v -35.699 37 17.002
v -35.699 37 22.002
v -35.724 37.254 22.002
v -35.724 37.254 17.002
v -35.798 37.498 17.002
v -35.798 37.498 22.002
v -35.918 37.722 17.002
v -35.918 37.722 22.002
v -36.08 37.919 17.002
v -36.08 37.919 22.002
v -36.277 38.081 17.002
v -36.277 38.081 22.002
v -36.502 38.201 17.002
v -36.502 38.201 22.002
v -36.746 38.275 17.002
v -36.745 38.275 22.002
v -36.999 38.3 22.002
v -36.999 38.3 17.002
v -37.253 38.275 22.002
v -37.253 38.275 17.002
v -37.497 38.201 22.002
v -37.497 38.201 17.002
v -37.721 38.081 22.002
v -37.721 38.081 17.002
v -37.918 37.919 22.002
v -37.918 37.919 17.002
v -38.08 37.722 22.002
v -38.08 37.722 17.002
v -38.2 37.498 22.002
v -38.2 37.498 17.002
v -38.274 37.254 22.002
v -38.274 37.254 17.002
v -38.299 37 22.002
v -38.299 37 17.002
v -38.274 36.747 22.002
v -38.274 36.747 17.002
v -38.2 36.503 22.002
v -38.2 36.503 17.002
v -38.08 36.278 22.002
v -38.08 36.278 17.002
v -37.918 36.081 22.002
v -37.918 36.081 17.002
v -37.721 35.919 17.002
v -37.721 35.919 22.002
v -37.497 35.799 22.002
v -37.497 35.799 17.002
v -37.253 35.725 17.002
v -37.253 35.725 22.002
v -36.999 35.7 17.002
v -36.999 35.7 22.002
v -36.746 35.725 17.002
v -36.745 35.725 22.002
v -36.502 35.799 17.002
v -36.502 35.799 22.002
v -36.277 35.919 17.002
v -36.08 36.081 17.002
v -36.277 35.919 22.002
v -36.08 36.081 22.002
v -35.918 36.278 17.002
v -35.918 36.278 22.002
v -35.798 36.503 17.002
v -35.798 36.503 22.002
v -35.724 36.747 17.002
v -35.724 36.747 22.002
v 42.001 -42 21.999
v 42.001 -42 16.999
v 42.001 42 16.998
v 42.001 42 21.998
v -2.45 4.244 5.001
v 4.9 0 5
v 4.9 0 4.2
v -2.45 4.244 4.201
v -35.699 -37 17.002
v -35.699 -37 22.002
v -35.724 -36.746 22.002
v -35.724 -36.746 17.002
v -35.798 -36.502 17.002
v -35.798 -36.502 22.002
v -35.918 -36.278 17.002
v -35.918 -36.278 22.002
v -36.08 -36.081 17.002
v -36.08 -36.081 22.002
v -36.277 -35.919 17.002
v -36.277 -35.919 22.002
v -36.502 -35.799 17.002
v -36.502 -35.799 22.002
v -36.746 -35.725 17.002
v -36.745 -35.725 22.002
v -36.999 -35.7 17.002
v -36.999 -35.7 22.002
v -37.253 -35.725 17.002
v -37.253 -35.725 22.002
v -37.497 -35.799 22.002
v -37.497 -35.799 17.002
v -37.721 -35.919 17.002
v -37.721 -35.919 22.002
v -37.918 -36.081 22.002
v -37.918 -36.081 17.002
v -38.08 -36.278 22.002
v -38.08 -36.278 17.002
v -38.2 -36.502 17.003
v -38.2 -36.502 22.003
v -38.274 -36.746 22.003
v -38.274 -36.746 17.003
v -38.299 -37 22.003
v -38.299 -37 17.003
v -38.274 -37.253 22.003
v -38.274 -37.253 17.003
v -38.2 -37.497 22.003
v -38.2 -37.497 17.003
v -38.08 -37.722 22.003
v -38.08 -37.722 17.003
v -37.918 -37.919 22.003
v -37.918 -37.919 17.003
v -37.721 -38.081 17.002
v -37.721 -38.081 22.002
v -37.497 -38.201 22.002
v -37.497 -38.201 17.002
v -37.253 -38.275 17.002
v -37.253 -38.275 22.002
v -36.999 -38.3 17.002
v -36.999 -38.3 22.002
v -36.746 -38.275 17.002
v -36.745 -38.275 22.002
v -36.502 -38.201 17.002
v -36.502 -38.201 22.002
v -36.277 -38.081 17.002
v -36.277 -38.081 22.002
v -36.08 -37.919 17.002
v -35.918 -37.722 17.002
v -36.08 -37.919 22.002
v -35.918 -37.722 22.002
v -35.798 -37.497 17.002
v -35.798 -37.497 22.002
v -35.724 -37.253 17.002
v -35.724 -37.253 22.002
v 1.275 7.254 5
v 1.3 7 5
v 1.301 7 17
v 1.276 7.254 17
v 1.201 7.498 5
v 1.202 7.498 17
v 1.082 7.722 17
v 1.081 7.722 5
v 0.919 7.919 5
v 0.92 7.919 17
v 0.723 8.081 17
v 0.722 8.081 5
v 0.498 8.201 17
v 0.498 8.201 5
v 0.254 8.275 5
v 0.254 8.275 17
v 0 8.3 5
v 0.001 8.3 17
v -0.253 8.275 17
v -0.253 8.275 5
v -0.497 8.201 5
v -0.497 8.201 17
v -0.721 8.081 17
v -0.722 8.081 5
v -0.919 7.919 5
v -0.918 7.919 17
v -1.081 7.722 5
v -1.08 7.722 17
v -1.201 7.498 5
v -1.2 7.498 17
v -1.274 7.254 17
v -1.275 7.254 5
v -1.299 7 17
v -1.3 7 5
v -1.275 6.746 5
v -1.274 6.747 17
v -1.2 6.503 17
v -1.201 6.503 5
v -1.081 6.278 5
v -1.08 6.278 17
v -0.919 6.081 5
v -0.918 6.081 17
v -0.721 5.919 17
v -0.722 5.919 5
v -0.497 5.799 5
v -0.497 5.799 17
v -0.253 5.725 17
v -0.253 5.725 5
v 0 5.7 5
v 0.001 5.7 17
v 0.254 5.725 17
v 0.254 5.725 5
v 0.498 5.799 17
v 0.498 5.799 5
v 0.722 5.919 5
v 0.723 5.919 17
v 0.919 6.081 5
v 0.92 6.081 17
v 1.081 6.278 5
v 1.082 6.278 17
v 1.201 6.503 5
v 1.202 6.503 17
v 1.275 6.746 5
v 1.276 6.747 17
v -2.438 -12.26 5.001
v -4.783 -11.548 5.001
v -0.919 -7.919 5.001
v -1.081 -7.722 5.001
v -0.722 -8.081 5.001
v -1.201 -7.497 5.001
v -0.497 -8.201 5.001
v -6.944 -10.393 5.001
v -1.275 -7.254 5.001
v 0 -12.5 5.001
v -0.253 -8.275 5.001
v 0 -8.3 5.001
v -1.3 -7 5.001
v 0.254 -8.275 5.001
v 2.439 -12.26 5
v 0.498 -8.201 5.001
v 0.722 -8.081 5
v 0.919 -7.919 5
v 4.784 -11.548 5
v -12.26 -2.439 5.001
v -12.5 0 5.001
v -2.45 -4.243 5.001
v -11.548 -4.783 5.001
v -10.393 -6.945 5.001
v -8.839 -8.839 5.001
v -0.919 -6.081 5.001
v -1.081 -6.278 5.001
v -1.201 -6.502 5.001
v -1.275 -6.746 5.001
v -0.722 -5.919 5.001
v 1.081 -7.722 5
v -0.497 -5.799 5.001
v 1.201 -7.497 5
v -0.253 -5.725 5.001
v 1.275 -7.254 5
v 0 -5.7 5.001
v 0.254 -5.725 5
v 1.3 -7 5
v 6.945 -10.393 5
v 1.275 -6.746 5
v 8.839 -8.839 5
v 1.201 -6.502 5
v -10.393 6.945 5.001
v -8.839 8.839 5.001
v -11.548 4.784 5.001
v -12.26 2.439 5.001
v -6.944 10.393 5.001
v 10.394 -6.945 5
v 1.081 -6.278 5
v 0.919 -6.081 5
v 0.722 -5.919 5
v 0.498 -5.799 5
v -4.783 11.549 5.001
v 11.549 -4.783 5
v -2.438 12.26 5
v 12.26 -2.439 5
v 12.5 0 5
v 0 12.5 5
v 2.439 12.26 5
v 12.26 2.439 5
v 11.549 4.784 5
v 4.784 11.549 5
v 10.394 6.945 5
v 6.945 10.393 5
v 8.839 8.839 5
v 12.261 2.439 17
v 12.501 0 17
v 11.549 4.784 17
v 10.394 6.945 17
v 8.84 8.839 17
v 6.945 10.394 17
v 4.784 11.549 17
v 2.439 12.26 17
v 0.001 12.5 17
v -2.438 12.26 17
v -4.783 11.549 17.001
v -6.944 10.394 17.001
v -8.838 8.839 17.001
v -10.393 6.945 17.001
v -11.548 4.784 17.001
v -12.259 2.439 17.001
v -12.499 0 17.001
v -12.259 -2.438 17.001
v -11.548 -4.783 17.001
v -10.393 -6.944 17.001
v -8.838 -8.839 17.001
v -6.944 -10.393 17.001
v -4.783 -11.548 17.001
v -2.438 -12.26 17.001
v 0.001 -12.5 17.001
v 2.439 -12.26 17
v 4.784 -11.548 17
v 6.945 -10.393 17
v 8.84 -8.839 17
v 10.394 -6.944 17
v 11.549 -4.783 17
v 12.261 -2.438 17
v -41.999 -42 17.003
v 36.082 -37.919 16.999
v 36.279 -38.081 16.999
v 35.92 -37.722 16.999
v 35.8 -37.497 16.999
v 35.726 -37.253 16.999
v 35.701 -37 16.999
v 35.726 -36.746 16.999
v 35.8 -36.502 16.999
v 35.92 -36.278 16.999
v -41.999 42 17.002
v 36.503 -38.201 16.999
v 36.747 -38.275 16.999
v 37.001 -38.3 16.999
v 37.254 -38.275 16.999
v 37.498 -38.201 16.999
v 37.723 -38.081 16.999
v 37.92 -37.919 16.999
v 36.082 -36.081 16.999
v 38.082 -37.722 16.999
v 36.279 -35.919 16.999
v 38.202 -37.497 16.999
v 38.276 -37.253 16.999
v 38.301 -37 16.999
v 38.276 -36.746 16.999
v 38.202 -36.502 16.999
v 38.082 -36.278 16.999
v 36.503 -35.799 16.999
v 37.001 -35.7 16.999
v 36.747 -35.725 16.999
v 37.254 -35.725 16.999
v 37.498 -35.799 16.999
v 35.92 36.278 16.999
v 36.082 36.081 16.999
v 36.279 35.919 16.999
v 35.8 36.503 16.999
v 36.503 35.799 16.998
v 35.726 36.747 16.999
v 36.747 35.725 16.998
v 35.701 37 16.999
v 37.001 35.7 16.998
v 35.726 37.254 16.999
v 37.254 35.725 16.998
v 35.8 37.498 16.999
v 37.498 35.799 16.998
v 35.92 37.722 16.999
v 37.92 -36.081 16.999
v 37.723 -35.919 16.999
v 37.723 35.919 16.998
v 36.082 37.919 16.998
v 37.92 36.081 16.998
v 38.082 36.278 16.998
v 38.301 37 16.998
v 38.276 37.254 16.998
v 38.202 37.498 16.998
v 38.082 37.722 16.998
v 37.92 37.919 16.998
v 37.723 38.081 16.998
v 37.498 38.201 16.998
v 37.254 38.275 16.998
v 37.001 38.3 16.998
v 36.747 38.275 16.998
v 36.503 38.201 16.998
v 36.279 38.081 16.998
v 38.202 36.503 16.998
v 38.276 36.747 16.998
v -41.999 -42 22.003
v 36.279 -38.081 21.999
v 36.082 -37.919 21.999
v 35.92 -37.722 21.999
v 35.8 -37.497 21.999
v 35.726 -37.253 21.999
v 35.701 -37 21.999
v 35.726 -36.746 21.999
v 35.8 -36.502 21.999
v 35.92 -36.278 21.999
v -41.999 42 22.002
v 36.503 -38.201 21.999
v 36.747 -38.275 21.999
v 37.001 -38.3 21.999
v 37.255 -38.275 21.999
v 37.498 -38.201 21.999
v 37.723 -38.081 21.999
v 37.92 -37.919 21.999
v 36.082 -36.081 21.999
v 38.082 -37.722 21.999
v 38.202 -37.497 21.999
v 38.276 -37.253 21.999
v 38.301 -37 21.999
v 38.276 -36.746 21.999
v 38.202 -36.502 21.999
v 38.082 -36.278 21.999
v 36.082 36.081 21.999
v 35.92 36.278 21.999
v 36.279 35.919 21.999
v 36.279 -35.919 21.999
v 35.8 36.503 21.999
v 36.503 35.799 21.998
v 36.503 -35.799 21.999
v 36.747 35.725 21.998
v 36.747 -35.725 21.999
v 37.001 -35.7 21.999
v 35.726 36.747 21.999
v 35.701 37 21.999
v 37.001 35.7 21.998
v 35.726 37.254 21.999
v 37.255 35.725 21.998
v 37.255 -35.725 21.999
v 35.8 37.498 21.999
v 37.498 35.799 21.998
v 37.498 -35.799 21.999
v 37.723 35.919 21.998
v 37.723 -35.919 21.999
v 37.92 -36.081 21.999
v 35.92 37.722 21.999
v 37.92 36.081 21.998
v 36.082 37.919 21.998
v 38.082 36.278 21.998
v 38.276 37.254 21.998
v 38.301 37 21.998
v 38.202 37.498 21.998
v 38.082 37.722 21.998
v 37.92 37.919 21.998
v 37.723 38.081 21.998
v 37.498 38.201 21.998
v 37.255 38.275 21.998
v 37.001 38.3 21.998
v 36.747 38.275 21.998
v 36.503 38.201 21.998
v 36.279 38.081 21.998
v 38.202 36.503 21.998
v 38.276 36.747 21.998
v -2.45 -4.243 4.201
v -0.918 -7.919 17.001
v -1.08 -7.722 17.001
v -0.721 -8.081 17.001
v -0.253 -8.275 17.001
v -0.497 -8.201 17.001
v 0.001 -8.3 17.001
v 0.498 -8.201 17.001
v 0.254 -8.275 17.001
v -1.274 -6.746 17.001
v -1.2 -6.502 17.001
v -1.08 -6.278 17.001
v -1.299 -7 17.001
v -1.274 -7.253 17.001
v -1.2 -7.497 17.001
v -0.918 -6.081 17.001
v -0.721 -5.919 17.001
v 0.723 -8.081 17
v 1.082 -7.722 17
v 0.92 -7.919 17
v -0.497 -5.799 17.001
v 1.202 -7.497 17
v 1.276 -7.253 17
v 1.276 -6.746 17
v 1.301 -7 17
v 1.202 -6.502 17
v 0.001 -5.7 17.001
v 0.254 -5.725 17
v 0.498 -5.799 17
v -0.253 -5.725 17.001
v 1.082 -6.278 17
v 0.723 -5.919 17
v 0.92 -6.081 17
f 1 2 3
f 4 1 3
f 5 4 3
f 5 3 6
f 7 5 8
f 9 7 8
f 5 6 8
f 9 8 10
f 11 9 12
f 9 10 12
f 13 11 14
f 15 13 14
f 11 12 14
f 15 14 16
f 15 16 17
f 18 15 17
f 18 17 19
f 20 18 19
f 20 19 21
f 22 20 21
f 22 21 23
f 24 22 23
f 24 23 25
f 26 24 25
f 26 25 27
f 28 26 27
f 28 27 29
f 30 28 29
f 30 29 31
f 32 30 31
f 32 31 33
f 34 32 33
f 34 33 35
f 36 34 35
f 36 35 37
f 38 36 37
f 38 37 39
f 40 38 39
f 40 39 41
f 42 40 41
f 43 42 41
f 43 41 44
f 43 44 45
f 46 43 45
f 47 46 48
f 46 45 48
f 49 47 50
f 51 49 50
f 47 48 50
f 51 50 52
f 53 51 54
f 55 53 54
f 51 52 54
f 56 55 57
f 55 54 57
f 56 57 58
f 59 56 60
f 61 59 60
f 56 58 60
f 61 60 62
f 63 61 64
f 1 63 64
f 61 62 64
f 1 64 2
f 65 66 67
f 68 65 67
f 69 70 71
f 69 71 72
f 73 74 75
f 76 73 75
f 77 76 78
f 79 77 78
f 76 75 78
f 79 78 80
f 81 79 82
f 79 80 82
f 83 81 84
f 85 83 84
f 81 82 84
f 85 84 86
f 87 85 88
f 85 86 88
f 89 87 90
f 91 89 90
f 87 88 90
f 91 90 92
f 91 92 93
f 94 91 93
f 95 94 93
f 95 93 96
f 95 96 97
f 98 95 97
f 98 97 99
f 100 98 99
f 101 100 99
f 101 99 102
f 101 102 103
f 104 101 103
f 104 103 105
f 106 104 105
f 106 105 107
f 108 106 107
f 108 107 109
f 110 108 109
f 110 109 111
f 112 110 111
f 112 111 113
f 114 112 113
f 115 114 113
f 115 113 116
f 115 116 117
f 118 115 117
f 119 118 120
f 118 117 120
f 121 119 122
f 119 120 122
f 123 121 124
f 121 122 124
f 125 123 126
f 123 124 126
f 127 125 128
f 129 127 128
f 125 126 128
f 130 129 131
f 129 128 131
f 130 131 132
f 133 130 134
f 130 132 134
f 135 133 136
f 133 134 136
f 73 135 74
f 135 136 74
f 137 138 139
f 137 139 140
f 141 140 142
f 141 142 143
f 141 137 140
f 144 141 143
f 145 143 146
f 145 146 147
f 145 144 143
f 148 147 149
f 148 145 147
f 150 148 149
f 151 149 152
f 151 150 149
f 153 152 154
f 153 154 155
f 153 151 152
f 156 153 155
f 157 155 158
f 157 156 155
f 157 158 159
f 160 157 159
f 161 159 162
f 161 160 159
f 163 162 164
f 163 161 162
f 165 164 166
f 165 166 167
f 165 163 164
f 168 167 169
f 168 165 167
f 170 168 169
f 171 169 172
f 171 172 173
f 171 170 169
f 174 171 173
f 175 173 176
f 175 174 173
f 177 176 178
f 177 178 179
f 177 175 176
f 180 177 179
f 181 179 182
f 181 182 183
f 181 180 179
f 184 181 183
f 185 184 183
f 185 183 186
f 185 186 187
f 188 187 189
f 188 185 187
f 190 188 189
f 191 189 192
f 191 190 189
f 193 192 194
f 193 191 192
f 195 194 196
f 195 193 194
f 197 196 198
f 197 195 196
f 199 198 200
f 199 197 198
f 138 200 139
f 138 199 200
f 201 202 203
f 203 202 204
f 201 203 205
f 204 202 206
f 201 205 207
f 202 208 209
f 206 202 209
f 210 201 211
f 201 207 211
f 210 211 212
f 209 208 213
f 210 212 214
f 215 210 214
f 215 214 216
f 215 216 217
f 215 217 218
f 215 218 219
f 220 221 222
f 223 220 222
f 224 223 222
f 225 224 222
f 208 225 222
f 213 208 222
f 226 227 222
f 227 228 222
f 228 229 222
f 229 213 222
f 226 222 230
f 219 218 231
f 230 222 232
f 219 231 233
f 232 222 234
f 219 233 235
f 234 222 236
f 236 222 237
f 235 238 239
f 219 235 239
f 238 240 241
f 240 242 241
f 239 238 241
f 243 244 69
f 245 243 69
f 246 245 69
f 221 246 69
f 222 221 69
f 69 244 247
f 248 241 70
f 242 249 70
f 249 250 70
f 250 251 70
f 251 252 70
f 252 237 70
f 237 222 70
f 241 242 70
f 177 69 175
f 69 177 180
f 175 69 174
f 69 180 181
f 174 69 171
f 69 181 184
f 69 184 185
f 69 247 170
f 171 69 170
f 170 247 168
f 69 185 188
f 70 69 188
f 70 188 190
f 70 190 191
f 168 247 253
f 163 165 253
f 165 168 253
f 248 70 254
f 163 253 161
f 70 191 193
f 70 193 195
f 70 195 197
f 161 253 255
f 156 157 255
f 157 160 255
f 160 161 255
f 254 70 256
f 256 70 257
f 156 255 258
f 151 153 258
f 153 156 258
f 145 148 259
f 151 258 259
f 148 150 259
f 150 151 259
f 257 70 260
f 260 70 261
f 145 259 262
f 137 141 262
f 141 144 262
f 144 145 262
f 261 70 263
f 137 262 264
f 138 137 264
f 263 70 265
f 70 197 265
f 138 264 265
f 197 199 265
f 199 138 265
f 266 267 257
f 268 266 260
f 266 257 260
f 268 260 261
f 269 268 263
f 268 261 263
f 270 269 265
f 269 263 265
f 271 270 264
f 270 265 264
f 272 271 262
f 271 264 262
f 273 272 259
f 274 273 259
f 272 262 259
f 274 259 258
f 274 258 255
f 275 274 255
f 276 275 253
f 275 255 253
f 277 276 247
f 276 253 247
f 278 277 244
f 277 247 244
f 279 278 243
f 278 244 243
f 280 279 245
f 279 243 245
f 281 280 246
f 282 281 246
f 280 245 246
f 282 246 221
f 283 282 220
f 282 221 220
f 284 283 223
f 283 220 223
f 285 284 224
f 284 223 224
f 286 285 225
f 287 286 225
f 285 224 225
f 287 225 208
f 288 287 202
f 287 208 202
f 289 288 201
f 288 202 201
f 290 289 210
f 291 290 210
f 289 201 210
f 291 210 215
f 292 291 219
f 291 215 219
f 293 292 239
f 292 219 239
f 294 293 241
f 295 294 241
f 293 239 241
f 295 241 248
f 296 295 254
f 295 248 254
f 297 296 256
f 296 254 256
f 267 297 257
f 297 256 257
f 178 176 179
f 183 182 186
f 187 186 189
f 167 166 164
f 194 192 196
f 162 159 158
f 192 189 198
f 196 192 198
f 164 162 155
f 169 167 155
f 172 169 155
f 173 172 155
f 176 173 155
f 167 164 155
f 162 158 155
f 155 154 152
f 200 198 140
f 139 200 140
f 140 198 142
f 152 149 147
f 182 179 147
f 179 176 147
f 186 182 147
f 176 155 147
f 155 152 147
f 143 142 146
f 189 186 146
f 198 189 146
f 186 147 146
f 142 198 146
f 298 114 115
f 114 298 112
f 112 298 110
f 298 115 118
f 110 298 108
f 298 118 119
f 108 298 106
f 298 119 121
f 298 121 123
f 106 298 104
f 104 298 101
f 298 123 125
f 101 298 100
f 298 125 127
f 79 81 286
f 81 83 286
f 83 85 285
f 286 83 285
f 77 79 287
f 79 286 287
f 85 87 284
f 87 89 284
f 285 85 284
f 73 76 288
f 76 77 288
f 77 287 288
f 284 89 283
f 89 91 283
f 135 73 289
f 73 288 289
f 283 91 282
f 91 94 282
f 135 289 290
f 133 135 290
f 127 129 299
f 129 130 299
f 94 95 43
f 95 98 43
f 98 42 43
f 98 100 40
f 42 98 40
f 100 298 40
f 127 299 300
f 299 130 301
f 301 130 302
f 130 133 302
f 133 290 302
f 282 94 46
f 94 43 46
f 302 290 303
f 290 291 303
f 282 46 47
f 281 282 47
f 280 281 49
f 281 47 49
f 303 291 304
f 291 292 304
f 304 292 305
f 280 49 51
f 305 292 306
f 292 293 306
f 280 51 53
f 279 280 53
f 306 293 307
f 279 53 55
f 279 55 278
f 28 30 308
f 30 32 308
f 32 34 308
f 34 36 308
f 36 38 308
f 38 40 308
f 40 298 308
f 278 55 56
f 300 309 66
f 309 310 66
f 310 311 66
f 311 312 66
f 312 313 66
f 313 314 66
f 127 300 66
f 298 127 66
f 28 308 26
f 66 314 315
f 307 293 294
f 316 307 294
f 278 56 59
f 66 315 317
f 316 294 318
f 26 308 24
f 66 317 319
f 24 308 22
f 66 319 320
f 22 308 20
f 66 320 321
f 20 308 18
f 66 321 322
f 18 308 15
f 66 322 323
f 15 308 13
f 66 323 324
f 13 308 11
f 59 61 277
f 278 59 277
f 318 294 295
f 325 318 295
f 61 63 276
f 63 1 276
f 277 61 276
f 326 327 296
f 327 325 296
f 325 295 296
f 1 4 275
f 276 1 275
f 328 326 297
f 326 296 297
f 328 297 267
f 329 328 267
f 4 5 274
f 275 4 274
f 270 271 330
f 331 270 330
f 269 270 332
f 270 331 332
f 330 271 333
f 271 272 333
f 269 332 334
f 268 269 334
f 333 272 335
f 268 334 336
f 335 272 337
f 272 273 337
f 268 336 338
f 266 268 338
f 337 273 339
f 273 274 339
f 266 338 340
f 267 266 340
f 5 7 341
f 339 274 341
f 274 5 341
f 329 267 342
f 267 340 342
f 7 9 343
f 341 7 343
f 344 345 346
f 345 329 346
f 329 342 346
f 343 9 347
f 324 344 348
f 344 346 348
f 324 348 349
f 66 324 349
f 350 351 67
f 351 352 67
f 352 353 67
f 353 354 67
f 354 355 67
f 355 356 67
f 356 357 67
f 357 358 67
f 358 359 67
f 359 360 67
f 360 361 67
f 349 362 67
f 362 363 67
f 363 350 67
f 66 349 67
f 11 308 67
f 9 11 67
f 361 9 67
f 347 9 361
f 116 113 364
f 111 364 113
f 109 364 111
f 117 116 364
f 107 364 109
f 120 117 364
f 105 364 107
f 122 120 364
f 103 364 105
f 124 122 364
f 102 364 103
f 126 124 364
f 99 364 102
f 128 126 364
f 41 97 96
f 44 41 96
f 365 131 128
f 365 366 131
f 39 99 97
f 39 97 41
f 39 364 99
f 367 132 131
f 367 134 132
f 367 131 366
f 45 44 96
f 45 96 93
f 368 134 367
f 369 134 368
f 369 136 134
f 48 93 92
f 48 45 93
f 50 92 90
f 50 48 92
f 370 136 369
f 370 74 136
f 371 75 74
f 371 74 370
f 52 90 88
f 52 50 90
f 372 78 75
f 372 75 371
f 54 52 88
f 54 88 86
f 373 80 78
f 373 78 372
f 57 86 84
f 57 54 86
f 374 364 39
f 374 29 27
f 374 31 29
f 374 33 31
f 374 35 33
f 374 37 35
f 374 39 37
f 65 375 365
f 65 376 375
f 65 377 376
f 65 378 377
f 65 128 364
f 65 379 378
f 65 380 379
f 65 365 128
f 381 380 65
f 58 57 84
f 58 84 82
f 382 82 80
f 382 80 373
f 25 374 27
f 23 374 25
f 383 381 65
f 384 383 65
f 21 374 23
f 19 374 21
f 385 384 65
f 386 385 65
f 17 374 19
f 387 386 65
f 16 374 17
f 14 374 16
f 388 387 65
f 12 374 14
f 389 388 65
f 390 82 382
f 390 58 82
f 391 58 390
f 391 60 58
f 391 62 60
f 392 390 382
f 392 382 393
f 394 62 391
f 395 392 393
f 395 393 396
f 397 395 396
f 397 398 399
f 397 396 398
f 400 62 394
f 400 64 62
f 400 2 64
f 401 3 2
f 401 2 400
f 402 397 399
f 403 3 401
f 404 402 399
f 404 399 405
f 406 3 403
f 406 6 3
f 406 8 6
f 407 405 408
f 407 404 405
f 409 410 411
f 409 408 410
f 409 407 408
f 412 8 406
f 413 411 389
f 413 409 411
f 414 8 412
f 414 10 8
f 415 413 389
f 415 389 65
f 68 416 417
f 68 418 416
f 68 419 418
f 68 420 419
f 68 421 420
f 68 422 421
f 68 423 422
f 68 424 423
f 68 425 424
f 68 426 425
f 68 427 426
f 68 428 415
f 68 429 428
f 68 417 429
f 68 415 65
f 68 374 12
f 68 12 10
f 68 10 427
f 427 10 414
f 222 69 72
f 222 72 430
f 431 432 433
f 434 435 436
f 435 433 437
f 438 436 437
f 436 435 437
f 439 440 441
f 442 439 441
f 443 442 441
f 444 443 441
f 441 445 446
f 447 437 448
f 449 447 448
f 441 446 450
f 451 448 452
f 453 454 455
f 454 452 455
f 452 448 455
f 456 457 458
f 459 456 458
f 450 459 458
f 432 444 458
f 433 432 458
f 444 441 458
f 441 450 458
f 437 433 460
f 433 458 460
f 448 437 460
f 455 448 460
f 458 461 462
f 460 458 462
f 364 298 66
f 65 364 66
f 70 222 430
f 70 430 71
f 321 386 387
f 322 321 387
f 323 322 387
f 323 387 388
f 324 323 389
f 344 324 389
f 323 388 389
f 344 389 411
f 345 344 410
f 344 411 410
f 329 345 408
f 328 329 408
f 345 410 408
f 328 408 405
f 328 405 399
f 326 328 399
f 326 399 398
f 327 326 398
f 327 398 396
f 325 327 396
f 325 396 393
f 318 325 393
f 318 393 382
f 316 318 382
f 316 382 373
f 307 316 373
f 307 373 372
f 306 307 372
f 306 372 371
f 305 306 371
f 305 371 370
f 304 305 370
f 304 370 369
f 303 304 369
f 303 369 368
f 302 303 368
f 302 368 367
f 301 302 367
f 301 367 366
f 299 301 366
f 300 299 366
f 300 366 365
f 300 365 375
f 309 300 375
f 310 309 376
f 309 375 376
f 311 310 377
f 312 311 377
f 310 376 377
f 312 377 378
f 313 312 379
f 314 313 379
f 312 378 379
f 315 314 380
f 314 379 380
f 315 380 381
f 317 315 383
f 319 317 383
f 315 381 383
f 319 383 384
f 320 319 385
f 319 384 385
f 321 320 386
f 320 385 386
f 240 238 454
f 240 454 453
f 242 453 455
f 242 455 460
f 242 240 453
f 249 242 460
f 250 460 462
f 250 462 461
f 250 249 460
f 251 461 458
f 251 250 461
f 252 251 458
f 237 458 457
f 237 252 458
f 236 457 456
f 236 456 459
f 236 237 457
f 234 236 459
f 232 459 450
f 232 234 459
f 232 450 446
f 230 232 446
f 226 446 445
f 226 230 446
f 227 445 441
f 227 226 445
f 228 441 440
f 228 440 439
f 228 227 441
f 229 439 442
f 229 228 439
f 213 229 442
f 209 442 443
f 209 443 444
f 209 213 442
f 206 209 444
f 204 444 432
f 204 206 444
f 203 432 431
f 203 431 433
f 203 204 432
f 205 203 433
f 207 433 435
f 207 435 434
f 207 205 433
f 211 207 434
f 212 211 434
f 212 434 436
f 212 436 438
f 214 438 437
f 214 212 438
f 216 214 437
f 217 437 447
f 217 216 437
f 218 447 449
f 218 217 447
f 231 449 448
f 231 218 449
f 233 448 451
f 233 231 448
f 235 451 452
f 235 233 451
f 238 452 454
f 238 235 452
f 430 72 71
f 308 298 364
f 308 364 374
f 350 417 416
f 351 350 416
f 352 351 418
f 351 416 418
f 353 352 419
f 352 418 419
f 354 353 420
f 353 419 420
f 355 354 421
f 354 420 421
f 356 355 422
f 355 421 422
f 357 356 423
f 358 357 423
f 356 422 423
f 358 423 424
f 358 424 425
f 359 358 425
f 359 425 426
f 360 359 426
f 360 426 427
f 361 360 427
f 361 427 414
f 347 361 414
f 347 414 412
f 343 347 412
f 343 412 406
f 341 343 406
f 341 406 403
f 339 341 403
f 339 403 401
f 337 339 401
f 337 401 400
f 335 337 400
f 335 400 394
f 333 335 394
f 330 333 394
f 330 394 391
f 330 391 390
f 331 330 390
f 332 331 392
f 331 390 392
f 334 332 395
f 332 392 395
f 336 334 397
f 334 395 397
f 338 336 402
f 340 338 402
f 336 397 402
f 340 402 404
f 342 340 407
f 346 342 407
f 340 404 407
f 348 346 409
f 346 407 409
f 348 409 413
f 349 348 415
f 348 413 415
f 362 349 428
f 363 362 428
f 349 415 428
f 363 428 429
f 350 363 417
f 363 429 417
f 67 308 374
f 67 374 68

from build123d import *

# Parameters (mm, degrees)
SKETCH003_R     = 12.5
SKETCH003_R_2   = 1.3
PAD_DEPTH       = 12
PAD001_DEPTH    = 0.8
SKETCH005_W     = 84
SKETCH005_H     = 84
PAD002_DEPTH    = 5
SKETCH030_R     = 1.3
POCKET014_DEPTH = 17.8034874046


with BuildPart() as part:
    # Sketch003 (on DatumPlane) → Pad (new body)
    with BuildSketch(Plane(origin=(0.0002244487, 4.55156e-05, 5.000457982), x_dir=(0.999999999, -4e-10, -4.48856e-05), z_dir=(4.48856e-05, 9.1023e-06, 0.999999999))):
        Circle(SKETCH003_R)
        with Locations((0, 7)):
            Circle(SKETCH003_R_2, mode=Mode.SUBTRACT)
        with Locations((0, -7)):
            Circle(SKETCH003_R_2, mode=Mode.SUBTRACT)
    extrude(amount=PAD_DEPTH)

    # Sketch004 (on Face1 of CopyPocket002) → Pad001 (join)
    with BuildSketch(Plane(origin=(0.0002244487, 4.55156e-05, 5.000457982), x_dir=(0.999999999, -4e-10, -4.48856e-05), z_dir=(4.48856e-05, 9.1023e-06, 0.999999999))):
        Polygon((4.9, 0), (-2.45, 4.2435244785), (-2.45, -4.2435244785), align=None)
    extrude(amount=-PAD001_DEPTH)

    # Sketch005 (on Face3 of Pad001) → Pad002 (join)
    with BuildSketch(Plane(origin=(0.0007630761, 0.000154743, 17.0004579694), x_dir=(0.999999999, -4e-10, -4.48856e-05), z_dir=(4.48856e-05, 9.1023e-06, 0.999999999))):
        Rectangle(SKETCH005_W, SKETCH005_H)
    extrude(amount=PAD002_DEPTH)

    # Sketch030 (on Face5 of Pad002) → Pocket014 (cut, through all)
    with BuildSketch(Plane(origin=(0.0009875042, 0.0002002544, 22.0004579641), x_dir=(0.999999999, -4e-10, -4.48856e-05), z_dir=(4.48856e-05, 9.1023e-06, 0.999999999))):
        with Locations((-37, 37)):
            Circle(SKETCH030_R)
        with Locations((-37, -37)):
            Circle(SKETCH030_R)
        with Locations((37, -37)):
            Circle(SKETCH030_R)
        with Locations((37, 37)):
            Circle(SKETCH030_R)
    extrude(amount=-POCKET014_DEPTH, mode=Mode.SUBTRACT)


solid = part.part
